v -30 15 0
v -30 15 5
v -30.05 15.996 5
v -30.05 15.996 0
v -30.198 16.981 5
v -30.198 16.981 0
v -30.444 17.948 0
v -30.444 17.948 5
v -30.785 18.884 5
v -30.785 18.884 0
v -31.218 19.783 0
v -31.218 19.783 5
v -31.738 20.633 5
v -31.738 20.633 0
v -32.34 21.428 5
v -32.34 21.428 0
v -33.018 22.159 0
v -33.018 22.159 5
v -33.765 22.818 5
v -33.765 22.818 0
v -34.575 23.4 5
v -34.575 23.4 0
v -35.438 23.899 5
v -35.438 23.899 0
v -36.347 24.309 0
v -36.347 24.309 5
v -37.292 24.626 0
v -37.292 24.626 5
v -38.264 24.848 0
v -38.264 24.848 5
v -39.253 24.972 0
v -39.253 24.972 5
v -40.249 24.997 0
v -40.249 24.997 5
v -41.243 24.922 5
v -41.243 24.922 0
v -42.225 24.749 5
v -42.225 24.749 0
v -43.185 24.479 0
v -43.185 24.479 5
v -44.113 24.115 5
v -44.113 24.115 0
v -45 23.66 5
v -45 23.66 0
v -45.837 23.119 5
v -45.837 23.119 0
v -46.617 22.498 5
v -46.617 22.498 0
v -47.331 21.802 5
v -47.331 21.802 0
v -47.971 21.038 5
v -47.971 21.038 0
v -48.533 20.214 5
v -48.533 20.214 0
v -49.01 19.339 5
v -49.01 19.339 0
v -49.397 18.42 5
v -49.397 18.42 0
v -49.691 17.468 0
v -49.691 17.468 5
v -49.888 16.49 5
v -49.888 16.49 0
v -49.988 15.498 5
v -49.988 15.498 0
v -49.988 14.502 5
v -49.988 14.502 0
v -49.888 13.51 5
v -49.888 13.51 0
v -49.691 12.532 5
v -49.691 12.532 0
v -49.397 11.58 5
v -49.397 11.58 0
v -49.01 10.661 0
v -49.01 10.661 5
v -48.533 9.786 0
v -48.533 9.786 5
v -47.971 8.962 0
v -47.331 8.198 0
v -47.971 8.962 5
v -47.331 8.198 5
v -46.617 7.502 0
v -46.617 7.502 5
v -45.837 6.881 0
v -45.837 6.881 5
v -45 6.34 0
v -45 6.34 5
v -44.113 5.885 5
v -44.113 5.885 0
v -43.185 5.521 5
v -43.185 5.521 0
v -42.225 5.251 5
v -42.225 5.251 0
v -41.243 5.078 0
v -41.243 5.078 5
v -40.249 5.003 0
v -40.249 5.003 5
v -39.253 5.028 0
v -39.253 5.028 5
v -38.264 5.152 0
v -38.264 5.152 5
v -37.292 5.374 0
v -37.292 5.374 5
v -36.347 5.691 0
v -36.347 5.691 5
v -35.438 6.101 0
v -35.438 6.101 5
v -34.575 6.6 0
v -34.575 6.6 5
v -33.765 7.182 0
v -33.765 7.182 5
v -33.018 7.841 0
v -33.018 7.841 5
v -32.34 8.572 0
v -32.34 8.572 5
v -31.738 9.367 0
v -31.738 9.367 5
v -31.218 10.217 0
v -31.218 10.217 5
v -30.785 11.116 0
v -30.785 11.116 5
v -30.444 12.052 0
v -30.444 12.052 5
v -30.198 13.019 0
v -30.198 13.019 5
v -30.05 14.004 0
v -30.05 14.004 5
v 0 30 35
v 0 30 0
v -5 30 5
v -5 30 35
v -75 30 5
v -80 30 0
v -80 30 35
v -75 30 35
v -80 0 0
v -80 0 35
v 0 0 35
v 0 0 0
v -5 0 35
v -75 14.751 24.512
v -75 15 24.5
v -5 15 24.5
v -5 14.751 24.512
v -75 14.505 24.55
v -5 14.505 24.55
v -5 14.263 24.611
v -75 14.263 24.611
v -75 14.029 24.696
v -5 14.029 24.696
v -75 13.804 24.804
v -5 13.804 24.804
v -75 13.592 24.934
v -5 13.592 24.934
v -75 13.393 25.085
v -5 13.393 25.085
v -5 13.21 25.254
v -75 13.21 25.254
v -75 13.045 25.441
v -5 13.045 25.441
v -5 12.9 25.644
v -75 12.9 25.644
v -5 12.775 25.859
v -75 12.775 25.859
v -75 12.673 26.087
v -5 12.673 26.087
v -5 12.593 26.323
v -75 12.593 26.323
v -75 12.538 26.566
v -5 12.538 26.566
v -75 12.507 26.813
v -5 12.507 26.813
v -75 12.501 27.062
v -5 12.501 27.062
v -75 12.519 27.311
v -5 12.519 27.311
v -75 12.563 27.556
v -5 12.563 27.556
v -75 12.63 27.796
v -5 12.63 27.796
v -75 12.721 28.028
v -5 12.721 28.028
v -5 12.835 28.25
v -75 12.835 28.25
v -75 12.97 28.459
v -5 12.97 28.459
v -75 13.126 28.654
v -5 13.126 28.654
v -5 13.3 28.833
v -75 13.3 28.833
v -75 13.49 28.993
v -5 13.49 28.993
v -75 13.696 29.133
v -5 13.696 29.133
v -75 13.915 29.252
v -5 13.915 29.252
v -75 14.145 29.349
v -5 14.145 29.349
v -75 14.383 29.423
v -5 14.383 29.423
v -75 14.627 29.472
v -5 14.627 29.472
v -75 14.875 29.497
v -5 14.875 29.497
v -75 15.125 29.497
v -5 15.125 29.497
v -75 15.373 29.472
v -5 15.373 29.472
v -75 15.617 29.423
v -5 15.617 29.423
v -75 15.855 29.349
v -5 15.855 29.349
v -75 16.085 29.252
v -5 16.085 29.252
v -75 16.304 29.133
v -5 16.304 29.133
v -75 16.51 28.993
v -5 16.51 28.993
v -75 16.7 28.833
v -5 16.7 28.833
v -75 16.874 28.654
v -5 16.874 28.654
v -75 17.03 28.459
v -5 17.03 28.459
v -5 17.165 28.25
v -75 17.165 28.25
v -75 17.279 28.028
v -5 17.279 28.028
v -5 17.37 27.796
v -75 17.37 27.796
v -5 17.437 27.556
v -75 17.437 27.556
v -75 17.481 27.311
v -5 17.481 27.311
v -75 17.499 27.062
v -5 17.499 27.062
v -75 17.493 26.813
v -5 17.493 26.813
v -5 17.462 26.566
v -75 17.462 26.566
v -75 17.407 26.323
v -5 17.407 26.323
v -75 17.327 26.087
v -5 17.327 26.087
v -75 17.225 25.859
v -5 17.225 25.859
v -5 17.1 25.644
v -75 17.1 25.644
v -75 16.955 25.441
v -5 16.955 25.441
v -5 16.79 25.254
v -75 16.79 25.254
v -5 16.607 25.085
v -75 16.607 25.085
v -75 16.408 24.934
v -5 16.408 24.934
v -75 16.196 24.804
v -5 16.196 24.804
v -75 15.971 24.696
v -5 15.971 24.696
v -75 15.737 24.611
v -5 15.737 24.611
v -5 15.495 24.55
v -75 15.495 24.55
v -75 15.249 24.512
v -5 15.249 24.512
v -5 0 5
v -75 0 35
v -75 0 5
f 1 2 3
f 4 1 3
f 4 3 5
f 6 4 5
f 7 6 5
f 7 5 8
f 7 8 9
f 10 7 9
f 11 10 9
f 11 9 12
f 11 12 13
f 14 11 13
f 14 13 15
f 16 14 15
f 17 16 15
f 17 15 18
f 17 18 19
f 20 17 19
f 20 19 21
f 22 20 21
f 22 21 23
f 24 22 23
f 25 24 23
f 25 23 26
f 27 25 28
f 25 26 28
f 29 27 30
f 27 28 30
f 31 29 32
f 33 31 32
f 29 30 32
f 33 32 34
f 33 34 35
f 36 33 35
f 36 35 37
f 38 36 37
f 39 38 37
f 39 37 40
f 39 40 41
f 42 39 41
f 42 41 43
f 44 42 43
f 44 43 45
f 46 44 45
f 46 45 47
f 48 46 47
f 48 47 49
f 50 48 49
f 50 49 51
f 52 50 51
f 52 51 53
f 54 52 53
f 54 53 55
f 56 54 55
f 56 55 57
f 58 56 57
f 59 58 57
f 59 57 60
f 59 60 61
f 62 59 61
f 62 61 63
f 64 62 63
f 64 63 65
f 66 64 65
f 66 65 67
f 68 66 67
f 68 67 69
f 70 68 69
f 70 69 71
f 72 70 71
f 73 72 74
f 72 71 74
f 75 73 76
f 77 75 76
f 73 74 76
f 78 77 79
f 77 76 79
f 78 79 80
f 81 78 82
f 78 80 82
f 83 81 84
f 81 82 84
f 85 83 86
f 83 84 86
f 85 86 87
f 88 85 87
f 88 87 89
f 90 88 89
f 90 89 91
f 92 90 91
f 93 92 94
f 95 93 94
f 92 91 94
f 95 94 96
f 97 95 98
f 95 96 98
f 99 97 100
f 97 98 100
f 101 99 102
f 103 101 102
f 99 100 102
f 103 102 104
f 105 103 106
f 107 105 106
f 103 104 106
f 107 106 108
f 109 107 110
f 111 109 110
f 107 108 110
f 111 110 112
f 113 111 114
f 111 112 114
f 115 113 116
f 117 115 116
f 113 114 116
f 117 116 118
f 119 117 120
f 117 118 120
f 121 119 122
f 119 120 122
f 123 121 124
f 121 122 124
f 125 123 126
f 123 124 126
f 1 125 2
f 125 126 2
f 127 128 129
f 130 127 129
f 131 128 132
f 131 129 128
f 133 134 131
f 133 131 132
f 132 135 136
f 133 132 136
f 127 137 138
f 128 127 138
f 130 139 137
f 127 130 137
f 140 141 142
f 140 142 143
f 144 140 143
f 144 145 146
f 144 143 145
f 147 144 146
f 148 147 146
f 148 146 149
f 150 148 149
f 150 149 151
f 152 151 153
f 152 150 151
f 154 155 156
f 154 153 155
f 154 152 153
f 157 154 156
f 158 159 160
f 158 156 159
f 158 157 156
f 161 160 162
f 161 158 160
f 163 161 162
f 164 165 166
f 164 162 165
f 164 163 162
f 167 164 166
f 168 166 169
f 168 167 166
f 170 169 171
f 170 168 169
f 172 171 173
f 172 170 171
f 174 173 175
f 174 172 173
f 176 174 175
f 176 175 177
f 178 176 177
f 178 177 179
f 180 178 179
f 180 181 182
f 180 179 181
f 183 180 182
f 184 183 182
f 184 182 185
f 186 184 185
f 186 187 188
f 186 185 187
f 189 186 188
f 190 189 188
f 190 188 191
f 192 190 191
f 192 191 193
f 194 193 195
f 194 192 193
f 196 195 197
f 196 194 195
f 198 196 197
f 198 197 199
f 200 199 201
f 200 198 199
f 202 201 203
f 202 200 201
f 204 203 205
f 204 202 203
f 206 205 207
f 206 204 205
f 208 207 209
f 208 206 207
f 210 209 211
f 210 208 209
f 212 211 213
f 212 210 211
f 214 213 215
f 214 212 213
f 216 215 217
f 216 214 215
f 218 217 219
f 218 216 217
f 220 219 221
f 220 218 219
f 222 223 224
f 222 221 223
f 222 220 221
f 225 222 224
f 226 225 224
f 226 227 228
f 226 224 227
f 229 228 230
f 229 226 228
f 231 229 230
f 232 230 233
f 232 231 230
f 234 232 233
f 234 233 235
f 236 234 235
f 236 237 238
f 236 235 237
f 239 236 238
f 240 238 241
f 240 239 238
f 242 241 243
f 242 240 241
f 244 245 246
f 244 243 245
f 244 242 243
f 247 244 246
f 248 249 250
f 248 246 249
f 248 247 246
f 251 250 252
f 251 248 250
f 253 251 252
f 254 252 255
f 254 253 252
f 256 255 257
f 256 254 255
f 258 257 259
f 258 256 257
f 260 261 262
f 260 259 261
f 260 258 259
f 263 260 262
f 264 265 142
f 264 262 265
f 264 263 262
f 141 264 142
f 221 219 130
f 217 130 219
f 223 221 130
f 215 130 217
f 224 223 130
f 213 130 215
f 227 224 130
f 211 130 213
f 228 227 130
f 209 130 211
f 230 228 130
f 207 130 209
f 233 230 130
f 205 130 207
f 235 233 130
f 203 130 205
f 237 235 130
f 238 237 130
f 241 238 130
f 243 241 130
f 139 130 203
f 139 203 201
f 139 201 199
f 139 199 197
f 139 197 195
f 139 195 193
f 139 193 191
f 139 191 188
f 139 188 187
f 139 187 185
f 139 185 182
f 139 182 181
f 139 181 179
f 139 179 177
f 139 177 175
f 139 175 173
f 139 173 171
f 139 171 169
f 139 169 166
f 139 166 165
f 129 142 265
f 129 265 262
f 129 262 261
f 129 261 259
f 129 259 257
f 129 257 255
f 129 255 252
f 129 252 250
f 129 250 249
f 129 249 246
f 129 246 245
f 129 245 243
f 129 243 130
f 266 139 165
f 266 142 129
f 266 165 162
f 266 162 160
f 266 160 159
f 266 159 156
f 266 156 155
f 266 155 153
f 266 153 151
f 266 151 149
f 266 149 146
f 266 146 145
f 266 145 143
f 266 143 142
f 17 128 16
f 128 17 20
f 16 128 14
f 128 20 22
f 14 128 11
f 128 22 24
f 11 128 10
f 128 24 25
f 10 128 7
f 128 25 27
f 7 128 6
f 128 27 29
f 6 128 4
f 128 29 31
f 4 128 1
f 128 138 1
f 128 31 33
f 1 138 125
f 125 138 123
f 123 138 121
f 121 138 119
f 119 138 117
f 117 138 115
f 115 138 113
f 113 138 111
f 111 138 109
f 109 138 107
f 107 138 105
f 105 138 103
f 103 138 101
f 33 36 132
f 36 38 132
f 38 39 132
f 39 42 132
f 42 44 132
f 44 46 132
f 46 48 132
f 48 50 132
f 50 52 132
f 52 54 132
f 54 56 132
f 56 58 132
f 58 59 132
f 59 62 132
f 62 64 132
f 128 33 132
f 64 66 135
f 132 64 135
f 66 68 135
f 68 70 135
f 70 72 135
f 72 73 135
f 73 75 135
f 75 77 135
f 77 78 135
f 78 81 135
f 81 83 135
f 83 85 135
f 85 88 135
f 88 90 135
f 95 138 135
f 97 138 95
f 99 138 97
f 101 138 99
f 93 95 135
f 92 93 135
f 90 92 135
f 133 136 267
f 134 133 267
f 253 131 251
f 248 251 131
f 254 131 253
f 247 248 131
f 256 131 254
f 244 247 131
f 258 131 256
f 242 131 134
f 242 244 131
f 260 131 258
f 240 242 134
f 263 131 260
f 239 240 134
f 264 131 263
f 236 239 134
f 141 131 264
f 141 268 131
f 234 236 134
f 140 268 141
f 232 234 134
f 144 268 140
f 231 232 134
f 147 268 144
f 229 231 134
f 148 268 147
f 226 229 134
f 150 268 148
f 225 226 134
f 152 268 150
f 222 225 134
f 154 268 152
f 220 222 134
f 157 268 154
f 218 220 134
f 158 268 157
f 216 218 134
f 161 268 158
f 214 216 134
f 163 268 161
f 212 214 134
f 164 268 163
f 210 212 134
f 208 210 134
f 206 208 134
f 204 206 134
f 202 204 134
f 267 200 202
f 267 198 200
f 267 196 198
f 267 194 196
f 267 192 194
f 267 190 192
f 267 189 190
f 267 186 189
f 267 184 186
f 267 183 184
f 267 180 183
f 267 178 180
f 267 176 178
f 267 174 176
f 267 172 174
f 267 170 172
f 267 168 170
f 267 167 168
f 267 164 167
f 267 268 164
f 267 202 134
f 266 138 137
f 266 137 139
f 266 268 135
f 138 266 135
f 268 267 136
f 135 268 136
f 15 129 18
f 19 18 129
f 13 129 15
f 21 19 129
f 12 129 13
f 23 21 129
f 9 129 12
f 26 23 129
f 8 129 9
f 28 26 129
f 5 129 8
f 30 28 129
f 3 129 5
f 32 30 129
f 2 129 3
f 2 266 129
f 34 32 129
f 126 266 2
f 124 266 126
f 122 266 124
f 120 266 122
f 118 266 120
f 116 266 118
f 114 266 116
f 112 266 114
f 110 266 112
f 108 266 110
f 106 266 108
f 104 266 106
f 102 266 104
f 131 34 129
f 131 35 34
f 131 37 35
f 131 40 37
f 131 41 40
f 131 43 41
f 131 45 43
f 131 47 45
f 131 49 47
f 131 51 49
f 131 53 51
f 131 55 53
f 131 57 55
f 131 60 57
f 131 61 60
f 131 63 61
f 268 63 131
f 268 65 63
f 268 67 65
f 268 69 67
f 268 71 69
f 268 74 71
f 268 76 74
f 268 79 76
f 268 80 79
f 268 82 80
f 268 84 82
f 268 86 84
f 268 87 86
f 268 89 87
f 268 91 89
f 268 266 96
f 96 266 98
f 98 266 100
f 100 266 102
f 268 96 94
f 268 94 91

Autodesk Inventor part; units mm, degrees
ref_plane "YZ Plane" through (0, 0, 0) normal (1, 0, 0) x (0, 1, 0)
ref_plane "XZ Plane" through (0, 0, 0) normal (0, 1, 0) x (-1, 0, 0)
ref_plane "XY Plane" through (0, 0, 0) normal (0, 0, 1) x (1, 0, 0)
sketch "Boceto1" plane through (0, 0, 0) normal (0, 1, 0) x (-1, 0, 0)
  line L0 (0, 0) -> (80, 0)
  line L1 (80, 0) -> (80, 35)
  line L2 (80, 35) -> (0, 35)
  line L3 (0, 35) -> (0, 0)
  line L4 (75, 35) -> (5, 35)
  line L5 (5, 35) -> (5, 5)
  line L6 (5, 5) -> (75, 5)
  line L7 (75, 5) -> (75, 35)
  dimension "d0" = 80
  dimension "d1" = 35
  dimension "d2" = 70
  dimension "d3" = 30
  dimension "d14" = 5
extrude "Extrusión1" add sketch "Boceto1" along normal blind 30 contours L3 L2 L5 L6 L7 L1 L0
sketch "Boceto2" plane through (-75, 0, 5) normal (0, 0, 1) x (1, 0, 0)
  circle A0 centre (35, 15) radius 10
  point P0 (75, 0)
  dimension "d6" = 20
extrude "Extrusión2" cut sketch "Boceto2" against normal blind 30
sketch "Boceto3" plane through (-75, 0, 5) normal (1, 0, 0) x (0, 0, -1)
  circle A0 centre (-22, 15) radius 2.5
  line L0 (-30, 0) -> (-30, 30) projected
  line L1 (-30, 30) -> (0, 30) projected
  point P0 (5, 0)
  dimension "d9" = 5
  dimension "d12" = 8
  dimension "d13" = 15
extrude "Extrusión3" add sketch "Boceto3" along normal blind 70
properties part number "encaje"
